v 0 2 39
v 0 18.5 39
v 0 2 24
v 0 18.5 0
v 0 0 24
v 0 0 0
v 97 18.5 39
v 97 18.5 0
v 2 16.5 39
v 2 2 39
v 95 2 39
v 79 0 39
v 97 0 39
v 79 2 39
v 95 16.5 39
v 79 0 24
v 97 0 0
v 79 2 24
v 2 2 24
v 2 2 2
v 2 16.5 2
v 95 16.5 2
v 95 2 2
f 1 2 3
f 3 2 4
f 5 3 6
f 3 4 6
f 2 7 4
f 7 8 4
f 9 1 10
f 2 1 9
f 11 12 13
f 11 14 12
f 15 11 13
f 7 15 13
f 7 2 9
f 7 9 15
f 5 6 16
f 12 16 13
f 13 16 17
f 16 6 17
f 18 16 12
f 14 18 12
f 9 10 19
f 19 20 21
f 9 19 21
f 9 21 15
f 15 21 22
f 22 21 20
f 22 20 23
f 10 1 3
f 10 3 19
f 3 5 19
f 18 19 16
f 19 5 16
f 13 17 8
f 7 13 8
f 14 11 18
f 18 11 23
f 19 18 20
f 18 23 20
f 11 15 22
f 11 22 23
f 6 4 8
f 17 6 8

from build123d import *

# Parameters (mm, degrees)
F0_W     = 97
F0_H     = 18.5
F1_DEPTH = 2
F2_W     = 2
F2_H     = 2
F3_DEPTH = 37
F4_W     = 79
F4_H     = 15
F5_DEPTH = 2


with BuildPart() as f1:
    # F0 (on Top) → F1 (new body)
    with BuildSketch(Plane.XY):
        with Locations((48.5, 9.25)):
            Rectangle(F0_W, F0_H)
    extrude(amount=F1_DEPTH)

    # F2 (on face) → F3 (join)
    with BuildSketch(Plane.XY.offset(2)):
        with Locations((1, 1)):
            Rectangle(F2_W, F2_H)
        Polygon((2, 2), (2, 0), (97, 0), (97, 16.5), (95, 16.5), (95, 2), align=None)
        Polygon((0, 18.5), (0, 2), (2, 2), (2, 16.5), (95, 16.5), (95, 18.5), align=None)
        with Locations((96, 17.5)):
            Rectangle(F2_W, F2_H)
    extrude(amount=F3_DEPTH)

    # F4 (on face) → F5 (cut)
    with BuildSketch(Plane.XZ):
        with Locations((39.5, 31.5)):
            Rectangle(F4_W, F4_H)
    extrude(amount=-F5_DEPTH, mode=Mode.SUBTRACT)


solid = f1.part
